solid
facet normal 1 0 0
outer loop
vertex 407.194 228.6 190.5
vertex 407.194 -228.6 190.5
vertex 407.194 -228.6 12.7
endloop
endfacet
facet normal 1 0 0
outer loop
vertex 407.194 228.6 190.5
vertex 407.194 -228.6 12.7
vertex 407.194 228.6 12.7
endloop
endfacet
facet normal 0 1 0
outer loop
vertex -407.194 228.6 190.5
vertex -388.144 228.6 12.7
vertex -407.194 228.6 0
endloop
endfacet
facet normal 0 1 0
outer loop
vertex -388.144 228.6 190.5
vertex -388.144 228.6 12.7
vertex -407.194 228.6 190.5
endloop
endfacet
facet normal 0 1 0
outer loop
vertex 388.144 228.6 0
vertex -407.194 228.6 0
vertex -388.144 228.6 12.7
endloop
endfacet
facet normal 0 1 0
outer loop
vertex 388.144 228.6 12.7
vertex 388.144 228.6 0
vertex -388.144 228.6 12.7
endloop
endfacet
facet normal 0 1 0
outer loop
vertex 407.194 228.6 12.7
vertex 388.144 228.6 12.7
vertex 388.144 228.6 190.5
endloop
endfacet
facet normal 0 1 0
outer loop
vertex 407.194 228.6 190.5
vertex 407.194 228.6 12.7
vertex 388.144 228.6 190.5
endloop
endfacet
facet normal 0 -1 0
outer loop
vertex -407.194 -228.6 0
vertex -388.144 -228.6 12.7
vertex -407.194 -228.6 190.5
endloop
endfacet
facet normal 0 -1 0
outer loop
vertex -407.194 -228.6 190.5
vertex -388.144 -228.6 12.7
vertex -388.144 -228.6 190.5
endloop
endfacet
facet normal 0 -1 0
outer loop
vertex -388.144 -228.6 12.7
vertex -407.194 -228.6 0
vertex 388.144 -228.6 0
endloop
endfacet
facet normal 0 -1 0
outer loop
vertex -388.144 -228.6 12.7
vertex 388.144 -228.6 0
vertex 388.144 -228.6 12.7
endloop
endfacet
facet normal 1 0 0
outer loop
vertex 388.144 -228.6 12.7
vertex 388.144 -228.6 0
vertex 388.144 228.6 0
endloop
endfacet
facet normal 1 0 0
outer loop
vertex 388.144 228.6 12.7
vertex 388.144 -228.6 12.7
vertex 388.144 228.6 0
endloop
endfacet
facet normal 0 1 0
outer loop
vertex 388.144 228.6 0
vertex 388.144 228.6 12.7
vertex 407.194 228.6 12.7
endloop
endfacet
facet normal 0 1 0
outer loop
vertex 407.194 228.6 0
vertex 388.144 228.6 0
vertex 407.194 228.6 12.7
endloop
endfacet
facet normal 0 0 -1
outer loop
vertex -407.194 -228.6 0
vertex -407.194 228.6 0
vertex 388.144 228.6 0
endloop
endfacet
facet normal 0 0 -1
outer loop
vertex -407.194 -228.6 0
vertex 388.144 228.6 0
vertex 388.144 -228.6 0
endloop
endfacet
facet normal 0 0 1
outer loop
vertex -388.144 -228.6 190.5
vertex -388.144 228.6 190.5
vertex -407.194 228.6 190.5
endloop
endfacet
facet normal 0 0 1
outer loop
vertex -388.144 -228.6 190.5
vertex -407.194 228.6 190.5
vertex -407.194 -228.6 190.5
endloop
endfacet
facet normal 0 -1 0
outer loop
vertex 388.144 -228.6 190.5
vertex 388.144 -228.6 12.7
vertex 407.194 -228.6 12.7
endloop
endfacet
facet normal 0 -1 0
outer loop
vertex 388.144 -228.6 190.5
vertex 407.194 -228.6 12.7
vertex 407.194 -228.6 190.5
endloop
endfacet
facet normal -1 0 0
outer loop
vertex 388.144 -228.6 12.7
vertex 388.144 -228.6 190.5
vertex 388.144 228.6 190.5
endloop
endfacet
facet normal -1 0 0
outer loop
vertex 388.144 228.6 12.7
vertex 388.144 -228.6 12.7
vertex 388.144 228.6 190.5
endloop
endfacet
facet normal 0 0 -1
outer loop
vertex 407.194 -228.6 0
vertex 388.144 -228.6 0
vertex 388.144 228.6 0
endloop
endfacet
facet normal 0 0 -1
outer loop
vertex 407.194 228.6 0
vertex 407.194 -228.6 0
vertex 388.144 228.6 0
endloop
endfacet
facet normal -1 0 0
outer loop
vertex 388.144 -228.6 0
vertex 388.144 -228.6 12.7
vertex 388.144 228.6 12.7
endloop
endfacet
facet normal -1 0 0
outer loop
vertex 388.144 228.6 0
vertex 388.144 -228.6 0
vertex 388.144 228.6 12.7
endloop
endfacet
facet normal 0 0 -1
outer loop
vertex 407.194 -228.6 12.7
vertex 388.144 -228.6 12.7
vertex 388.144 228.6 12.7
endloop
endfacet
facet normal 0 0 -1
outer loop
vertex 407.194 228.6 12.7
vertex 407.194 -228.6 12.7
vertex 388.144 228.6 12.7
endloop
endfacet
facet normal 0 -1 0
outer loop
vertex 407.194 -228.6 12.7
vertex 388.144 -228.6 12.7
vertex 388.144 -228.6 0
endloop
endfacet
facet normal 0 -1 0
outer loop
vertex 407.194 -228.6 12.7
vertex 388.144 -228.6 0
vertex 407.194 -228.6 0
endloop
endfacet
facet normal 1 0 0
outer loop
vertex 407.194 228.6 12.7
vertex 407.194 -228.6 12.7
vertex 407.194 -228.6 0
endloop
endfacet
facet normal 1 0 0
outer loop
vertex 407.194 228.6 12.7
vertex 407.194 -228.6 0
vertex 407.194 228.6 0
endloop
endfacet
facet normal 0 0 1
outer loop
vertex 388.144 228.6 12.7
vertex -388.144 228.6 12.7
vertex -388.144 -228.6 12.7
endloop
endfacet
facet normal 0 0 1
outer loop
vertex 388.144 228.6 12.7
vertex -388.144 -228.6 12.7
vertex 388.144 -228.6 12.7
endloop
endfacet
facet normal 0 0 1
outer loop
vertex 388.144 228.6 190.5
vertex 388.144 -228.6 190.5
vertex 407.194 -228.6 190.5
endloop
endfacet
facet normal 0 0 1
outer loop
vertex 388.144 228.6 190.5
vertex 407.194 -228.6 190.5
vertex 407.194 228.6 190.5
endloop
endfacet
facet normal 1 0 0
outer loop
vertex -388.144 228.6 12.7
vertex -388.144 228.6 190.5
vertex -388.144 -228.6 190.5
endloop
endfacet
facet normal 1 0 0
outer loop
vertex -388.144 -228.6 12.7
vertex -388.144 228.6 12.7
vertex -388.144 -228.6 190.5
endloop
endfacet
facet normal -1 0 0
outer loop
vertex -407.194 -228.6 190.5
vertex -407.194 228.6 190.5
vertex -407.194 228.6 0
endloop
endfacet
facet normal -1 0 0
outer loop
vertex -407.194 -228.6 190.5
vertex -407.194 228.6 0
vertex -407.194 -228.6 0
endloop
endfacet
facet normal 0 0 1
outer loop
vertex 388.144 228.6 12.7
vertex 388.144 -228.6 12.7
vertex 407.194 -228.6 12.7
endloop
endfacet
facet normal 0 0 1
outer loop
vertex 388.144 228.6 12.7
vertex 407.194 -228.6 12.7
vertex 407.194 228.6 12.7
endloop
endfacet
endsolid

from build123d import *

# Parameters (mm, degrees)
F0_W     = 776.2875
F0_H     = 457.2
F1_DEPTH = 12.7
F2_W     = 457.2
F2_H     = 177.8
F3_DEPTH = 19.05
F4_DEPTH = 12.7
F5_W     = 457.2
F5_H     = 190.5
F6_DEPTH = 19.05


with BuildPart() as f1:
    # F0 (on Top) → F1 (new body)
    with BuildSketch(Plane.XY):
        Rectangle(F0_W, F0_H)
    extrude(amount=F1_DEPTH)

    # F5 (on face) → F6 (join)
    with BuildSketch(Plane(origin=(-388.14375, 0, 0), x_dir=(0, -1, 0), z_dir=(-1, 0, 0))):
        with Locations((0, 95.25)):
            Rectangle(F5_W, F5_H)
    extrude(amount=F6_DEPTH)


with BuildPart() as f3:
    # F2 (on face) → F3 (new body)
    with BuildSketch(Plane.YZ.offset(388.14375)):
        with Locations((0, 101.6)):
            Rectangle(F2_W, F2_H)
    extrude(amount=F3_DEPTH)


with BuildPart() as f4:
    # F4 (new): a face of the model
    f4_faces = [f3.part.faces().sort_by_distance(p)[0] for p in [
        (397.66875, 0, 12.7),
    ]]
    extrude(f4_faces, amount=F4_DEPTH)


solid = Compound([f1.part, f3.part, f4.part])
